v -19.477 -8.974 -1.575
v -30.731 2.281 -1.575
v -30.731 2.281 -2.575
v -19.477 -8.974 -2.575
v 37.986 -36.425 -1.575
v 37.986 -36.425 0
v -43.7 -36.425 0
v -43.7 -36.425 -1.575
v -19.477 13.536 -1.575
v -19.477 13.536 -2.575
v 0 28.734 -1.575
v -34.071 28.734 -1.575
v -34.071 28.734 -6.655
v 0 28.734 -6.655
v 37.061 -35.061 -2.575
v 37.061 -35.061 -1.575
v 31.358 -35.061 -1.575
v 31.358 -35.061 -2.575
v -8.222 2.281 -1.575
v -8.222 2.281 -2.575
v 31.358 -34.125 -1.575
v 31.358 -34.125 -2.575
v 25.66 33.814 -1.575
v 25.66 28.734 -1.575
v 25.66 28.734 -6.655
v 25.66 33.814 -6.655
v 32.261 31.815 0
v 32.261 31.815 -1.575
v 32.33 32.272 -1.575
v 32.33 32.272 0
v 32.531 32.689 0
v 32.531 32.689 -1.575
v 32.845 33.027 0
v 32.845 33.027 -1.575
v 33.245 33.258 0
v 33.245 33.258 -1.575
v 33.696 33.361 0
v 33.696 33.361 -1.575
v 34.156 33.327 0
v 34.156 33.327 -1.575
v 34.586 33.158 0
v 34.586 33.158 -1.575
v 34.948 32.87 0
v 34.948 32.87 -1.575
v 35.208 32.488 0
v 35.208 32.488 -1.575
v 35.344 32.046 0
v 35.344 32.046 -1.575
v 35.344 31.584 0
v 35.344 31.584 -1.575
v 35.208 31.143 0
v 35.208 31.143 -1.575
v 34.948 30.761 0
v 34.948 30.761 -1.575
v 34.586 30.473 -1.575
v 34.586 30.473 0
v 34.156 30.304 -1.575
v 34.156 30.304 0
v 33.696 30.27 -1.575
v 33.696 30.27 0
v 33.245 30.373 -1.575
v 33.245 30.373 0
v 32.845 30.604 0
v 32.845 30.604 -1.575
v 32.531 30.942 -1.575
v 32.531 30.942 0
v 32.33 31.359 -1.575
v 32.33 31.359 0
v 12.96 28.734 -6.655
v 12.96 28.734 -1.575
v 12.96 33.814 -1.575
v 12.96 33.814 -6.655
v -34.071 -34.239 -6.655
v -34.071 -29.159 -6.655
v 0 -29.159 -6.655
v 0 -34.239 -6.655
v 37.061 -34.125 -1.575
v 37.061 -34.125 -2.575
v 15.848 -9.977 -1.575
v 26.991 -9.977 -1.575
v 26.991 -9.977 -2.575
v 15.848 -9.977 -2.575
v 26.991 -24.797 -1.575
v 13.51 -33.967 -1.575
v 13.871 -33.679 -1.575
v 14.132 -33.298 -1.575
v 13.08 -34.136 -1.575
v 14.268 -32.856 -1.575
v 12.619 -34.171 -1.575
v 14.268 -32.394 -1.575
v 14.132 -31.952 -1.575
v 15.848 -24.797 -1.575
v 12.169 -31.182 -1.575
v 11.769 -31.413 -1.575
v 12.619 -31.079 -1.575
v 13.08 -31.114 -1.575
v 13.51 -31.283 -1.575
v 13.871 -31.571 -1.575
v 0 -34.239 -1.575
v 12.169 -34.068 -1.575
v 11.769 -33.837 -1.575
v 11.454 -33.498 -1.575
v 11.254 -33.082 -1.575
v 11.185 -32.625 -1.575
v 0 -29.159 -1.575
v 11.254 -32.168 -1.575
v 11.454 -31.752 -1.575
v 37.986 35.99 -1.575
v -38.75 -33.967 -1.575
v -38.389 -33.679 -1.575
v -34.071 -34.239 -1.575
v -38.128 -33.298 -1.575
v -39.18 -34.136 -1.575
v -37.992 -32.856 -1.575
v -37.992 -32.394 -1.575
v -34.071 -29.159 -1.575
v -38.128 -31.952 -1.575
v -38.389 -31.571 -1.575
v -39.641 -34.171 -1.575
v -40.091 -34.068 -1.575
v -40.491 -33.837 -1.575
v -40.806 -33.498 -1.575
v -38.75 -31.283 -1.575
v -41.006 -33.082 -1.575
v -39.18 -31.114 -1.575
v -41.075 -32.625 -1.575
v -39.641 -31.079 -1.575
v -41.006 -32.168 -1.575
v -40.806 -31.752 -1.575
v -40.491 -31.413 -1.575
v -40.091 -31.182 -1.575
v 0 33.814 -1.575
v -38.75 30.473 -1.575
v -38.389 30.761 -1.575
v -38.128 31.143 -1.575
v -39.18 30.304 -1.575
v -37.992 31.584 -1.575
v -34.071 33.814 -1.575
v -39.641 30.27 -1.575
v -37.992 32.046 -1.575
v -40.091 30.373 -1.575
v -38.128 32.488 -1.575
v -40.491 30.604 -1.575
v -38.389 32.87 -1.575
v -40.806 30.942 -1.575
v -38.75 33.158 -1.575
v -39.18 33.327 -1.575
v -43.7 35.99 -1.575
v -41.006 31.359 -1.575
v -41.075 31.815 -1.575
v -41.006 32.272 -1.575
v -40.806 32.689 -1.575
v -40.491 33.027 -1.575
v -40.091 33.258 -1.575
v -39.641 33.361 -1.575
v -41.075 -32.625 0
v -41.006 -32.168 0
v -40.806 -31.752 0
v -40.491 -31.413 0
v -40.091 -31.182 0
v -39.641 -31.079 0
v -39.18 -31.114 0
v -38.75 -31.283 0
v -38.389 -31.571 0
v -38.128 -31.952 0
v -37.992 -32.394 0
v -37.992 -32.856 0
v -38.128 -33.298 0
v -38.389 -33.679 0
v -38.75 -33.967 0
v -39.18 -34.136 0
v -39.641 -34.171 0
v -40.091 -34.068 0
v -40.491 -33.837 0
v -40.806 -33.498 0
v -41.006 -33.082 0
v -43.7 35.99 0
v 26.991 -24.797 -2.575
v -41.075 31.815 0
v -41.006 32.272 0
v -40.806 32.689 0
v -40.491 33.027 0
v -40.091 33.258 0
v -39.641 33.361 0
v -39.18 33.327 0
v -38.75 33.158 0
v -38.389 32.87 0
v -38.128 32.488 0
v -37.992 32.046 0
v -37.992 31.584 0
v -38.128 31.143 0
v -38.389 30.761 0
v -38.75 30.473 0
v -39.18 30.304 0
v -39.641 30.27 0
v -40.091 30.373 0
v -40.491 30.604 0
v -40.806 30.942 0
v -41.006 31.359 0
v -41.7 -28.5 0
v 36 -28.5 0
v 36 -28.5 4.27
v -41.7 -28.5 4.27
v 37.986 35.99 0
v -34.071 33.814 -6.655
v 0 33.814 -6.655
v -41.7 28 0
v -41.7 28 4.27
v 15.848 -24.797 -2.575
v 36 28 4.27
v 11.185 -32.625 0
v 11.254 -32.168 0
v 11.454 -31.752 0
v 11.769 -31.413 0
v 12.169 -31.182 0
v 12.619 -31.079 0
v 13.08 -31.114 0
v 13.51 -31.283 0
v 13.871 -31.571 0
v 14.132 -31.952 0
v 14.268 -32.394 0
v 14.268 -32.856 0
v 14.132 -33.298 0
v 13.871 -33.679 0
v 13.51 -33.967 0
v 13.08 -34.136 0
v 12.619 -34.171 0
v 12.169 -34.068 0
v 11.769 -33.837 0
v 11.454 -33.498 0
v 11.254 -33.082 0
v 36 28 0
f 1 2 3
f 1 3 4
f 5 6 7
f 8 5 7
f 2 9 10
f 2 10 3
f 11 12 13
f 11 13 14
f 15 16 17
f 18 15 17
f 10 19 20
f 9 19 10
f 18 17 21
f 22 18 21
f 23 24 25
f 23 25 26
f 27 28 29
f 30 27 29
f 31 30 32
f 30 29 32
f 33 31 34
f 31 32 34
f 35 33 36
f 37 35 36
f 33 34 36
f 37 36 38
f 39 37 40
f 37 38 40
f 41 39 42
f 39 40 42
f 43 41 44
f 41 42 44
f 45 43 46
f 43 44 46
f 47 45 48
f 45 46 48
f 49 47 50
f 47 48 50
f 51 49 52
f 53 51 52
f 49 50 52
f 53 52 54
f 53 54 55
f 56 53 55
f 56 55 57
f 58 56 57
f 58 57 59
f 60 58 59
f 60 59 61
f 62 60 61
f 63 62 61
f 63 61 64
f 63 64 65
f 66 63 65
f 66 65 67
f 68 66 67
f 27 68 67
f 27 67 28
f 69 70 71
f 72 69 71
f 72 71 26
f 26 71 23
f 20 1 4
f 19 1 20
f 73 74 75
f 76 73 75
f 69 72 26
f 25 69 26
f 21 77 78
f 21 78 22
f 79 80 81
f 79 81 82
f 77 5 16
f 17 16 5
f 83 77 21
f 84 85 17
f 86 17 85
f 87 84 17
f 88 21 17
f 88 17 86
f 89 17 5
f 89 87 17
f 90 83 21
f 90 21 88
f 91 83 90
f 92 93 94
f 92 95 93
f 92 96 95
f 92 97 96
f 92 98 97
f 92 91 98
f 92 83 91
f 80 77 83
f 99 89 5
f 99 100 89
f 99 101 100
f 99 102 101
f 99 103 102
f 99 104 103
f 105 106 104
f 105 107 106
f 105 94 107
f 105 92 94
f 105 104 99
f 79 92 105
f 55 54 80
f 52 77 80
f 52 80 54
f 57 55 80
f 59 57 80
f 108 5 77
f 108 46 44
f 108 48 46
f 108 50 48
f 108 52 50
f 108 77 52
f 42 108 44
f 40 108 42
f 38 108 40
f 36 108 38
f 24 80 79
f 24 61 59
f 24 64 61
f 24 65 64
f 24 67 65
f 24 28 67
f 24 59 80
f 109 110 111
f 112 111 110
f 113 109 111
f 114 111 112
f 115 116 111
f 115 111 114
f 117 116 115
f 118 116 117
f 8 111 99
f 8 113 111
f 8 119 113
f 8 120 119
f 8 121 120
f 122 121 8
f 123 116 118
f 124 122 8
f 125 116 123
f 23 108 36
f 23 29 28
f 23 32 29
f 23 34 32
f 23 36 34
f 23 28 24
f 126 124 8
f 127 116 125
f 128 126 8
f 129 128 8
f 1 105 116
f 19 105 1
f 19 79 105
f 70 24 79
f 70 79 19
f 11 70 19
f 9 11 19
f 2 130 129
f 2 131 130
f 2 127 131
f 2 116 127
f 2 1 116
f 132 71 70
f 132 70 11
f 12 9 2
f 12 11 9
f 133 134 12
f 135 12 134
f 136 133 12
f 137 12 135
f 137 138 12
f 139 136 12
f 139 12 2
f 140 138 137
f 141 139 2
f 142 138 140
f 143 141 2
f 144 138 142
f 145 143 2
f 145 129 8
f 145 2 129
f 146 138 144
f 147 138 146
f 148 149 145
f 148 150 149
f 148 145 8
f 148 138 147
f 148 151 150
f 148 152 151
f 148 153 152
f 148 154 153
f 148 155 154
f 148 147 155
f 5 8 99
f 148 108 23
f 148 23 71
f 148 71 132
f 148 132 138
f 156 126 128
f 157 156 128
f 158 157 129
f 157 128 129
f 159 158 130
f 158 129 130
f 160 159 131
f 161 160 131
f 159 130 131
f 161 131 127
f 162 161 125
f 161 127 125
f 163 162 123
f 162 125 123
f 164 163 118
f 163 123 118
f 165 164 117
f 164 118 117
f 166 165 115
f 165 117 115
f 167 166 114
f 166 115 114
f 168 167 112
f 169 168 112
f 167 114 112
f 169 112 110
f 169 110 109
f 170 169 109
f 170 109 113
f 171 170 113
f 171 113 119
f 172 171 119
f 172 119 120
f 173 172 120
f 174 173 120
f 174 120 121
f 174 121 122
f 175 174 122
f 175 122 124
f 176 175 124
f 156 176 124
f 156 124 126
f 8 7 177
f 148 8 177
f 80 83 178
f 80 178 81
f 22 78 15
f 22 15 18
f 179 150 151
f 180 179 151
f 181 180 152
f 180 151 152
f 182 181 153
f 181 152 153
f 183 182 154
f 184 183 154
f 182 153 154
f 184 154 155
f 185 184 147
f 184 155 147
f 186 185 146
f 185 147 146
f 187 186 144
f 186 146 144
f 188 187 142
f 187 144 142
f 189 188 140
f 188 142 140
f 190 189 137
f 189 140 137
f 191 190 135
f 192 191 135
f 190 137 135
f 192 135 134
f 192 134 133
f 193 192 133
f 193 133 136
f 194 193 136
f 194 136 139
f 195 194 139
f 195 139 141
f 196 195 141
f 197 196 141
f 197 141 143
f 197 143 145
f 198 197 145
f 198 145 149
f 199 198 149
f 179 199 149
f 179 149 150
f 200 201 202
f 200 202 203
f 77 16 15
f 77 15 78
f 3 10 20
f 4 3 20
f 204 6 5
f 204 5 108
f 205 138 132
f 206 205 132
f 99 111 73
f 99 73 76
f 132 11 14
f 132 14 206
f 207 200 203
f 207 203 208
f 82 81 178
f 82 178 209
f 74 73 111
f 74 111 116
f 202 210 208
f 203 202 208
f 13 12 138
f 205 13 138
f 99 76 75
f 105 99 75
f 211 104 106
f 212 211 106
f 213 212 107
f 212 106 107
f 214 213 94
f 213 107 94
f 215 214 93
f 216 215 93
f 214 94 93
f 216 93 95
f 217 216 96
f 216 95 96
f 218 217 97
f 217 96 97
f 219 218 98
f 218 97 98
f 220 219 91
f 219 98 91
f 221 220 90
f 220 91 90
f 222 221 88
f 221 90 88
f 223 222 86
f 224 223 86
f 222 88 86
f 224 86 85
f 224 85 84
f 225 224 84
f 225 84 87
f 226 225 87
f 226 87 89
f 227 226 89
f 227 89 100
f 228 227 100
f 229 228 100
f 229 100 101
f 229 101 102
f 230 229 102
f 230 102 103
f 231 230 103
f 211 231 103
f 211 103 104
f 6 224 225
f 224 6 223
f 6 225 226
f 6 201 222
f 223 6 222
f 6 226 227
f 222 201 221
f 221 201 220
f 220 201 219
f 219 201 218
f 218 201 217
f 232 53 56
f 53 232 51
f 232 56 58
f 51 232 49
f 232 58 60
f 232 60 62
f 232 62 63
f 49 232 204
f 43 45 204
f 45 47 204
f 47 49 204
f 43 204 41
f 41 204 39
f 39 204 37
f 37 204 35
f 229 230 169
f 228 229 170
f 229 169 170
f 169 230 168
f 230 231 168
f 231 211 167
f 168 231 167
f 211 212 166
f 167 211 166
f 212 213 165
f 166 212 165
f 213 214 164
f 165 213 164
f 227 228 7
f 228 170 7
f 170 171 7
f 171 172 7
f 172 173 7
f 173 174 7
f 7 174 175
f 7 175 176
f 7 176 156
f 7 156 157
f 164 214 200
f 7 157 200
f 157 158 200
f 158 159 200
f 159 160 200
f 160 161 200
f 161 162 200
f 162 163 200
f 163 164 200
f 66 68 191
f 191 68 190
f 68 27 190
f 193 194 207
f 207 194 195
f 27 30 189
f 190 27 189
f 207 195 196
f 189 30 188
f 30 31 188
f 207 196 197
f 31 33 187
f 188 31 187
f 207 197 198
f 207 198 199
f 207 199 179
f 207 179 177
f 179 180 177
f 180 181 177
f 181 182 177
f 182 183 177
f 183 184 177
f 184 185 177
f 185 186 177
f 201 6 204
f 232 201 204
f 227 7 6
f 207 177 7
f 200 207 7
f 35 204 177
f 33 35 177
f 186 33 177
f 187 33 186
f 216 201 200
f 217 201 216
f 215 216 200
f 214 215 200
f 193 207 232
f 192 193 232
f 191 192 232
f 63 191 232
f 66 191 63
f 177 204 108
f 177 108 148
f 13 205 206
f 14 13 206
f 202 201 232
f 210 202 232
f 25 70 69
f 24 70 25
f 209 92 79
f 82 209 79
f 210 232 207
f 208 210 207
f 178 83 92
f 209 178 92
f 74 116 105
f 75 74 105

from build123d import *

# Parameters (mm, degrees)
SKETCH1_W           = 81.6864
SKETCH1_H           = 72.4154
BOSS_EXTRUDE1_DEPTH = 1.5748
SKETCH2_W           = 77.7
SKETCH2_H           = 56.5
BOSS_EXTRUDE2_DEPTH = 4.27
SKETCH4_R           = 1.55
CUT_EXTRUDE1_DEPTH  = 58.189442313
SKETCH3_W           = 12.7
SKETCH3_H           = 5.08
SKETCH3_W_2         = 34.071115987
BOSS_EXTRUDE3_DEPTH = 5.08
SKETCH5_W           = 11.143297124
SKETCH5_H           = 14.820585176
SKETCH5_W_2         = 5.702652661
SKETCH5_H_2         = 0.935331402
BOSS_EXTRUDE4_DEPTH = 1


with BuildPart() as part:
    # Sketch1 → Boss-Extrude1 (new body)
    with BuildSketch(Plane(origin=(0, 0, 0), x_dir=(-1, 0, 0), z_dir=(0, 0, -1))):
        with Locations((2.8568, -0.2173)):
            Rectangle(SKETCH1_W, SKETCH1_H)
    extrude(amount=BOSS_EXTRUDE1_DEPTH)

    # Sketch2 → Boss-Extrude2 (add)
    with BuildSketch(Plane(origin=(0, 0, 0), x_dir=(-1, 0, 0), z_dir=(0, 0, -1))):
        with Locations((2.85, -0.25)):
            Rectangle(SKETCH2_W, SKETCH2_H)
    extrude(amount=-BOSS_EXTRUDE2_DEPTH)

    # Sketch4 → Cut-Extrude1 (cut, through all)
    with BuildSketch(Plane(origin=(0, 0, -1.5748), x_dir=(-1, 0, 0), z_dir=(0, 0, -1))):
        with Locations((39.525, 31.8154)):
            Circle(SKETCH4_R)
        with Locations((39.525, -32.625)):
            Circle(SKETCH4_R)
        with Locations((-12.735, -32.625)):
            Circle(SKETCH4_R)
        with Locations((-33.8114, 31.8154)):
            Circle(SKETCH4_R)
    extrude(amount=-CUT_EXTRUDE1_DEPTH, mode=Mode.SUBTRACT)

    # Sketch3 → Boss-Extrude3 (add)
    with BuildSketch(Plane.XY.offset(-1.5748)):
        with Locations((19.31004682, 31.274104804)):
            Rectangle(SKETCH3_W, SKETCH3_H)
        with Locations((-17.035557993, 31.274104804)):
            Rectangle(SKETCH3_W_2, SKETCH3_H)
        with Locations((-17.035557993, -31.699250815)):
            Rectangle(SKETCH3_W_2, SKETCH3_H)
    extrude(amount=-BOSS_EXTRUDE3_DEPTH)

    # Sketch5 → Boss-Extrude4 (add)
    with BuildSketch(Plane(origin=(0, 0, -1.5748), x_dir=(-1, 0, 0), z_dir=(0, 0, -1))):
        Polygon((19.476551601, 13.535617464), (30.731281697, 2.280887368), (19.476551601, -8.973842728), (8.221821505, 2.280887368), align=None)
        with Locations((-21.419348846, -17.387032057)):
            Rectangle(SKETCH5_W, SKETCH5_H)
        with Locations((-34.20974354, -34.592993391)):
            Rectangle(SKETCH5_W_2, SKETCH5_H_2)
    extrude(amount=BOSS_EXTRUDE4_DEPTH)


solid = part.part
